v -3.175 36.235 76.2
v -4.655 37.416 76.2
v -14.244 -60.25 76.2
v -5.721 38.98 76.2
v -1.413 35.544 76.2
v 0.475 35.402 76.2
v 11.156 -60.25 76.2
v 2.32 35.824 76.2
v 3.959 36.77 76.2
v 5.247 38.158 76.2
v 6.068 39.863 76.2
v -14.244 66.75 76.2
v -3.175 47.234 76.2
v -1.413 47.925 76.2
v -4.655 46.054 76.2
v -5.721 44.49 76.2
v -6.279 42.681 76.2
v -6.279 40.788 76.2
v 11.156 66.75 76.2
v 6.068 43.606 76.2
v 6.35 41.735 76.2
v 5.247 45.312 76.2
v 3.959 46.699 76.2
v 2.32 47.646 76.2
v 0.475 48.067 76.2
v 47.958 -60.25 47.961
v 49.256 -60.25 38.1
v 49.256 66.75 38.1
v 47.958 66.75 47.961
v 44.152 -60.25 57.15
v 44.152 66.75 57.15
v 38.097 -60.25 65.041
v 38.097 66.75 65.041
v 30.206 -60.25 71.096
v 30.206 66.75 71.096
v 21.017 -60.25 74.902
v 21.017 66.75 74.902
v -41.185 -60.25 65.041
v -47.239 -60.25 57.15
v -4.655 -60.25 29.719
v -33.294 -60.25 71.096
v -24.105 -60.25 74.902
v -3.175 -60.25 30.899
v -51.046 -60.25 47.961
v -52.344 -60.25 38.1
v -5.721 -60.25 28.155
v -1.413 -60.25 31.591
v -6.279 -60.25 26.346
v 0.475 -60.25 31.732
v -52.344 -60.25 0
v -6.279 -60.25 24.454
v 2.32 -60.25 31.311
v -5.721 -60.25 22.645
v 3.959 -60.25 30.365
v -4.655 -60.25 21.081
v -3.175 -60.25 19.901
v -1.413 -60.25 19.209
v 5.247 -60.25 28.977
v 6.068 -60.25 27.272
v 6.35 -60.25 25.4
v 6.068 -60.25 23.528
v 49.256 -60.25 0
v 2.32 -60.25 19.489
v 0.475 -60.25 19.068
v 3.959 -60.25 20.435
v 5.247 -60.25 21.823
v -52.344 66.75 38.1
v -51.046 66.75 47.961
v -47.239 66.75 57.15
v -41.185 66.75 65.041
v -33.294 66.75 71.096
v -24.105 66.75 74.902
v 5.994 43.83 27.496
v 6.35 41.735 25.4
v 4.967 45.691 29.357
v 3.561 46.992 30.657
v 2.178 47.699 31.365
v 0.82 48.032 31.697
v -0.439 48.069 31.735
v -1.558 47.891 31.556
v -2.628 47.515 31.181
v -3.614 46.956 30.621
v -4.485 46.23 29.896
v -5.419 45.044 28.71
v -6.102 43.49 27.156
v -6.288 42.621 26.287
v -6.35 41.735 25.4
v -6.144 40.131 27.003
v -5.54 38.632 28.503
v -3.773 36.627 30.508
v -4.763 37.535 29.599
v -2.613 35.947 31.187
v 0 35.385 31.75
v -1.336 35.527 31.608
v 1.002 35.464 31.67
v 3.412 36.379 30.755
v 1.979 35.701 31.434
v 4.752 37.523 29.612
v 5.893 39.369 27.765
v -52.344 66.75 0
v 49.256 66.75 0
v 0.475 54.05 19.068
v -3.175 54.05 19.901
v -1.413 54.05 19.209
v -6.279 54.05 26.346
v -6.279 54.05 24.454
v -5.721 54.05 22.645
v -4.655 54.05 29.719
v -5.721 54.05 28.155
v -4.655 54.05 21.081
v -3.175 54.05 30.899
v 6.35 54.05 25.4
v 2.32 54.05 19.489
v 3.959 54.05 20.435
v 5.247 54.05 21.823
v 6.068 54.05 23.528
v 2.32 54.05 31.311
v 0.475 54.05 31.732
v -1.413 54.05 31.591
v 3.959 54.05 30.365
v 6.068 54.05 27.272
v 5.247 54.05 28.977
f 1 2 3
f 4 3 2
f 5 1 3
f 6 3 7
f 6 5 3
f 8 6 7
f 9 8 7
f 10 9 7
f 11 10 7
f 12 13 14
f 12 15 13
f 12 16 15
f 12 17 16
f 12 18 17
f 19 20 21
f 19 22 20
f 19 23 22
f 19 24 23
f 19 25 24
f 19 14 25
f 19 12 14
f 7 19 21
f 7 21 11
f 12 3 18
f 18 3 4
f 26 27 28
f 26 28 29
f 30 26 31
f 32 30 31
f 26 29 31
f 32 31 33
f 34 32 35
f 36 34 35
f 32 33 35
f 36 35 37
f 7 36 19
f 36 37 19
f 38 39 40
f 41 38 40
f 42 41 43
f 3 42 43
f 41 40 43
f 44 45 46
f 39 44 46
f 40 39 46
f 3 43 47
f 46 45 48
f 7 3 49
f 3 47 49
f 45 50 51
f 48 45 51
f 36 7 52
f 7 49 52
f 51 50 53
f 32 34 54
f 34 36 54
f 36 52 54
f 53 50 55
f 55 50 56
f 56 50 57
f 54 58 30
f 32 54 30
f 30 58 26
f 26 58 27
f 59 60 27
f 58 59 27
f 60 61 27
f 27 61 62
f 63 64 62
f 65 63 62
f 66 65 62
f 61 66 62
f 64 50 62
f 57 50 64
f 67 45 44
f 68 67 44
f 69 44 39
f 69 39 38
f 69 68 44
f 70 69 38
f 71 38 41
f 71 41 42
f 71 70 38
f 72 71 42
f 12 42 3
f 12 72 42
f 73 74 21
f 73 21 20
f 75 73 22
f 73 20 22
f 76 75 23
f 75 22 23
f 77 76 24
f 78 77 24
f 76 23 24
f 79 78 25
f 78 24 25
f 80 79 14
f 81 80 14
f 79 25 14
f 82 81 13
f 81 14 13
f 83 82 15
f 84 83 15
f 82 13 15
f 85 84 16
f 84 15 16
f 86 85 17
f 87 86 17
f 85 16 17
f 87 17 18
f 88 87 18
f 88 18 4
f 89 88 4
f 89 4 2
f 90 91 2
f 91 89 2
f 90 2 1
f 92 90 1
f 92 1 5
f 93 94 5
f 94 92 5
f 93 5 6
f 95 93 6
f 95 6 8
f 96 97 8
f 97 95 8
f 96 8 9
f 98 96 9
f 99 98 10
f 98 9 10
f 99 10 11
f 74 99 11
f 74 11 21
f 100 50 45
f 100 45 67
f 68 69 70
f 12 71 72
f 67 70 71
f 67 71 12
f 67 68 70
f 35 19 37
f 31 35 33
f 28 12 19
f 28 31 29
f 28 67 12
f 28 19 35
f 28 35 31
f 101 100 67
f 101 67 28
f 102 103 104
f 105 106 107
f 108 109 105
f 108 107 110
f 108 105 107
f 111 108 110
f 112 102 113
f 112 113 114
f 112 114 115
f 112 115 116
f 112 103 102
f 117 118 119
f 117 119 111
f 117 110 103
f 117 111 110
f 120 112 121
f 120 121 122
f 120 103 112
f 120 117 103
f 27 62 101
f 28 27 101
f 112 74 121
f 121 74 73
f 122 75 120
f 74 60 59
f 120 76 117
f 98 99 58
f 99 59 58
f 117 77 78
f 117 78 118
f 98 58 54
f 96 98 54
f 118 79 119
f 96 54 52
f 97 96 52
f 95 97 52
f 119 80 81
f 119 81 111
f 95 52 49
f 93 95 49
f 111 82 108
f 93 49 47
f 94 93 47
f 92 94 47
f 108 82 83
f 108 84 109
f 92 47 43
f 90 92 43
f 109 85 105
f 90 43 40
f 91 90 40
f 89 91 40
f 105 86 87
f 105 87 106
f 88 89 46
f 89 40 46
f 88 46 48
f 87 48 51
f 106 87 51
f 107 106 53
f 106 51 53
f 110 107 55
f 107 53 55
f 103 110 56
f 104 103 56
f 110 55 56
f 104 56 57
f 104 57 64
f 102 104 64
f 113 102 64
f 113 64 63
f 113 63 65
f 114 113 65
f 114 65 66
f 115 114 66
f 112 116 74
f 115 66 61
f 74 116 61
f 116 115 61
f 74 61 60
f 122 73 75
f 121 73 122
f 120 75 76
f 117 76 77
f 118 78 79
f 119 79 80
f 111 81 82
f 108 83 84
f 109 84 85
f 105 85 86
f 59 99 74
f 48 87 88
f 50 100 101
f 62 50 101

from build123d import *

# Parameters (mm, degrees)
F0_W     = 101.6
F0_H     = 127
F1_DEPTH = 76.2
F2_R     = 38.1
F3_R     = 6.35
F4_DEPTH = 114.3
F5_R     = 6.35
F6_DEPTH = 50.8


with BuildPart() as f1:
    # F0 (on Top) → F1 (new body)
    with BuildSketch(Plane.XY):
        with Locations((-1.54382, 3.250349)):
            Rectangle(F0_W, F0_H)
    extrude(amount=F1_DEPTH)

    # F2
    f2_edges = [f1.edges().sort_by_distance(p)[0] for p in [
        (-52.34382, 3.250349, 76.2),
        (49.25618, 3.250349, 76.2),
    ]]
    fillet(f2_edges, radius=F2_R)

    # F3 (on face) → F4 (cut)
    with BuildSketch(Plane.XZ.offset(60.249651)):
        with Locations((0, 25.4)):
            Circle(F3_R)
    extrude(amount=-F4_DEPTH, mode=Mode.SUBTRACT)

    # F5 (on face) → F6 (cut)
    with BuildSketch(Plane.XY.offset(76.2)):
        with Locations((0, 41.734669)):
            Circle(F5_R)
    extrude(amount=-F6_DEPTH, mode=Mode.SUBTRACT)


solid = f1.part
